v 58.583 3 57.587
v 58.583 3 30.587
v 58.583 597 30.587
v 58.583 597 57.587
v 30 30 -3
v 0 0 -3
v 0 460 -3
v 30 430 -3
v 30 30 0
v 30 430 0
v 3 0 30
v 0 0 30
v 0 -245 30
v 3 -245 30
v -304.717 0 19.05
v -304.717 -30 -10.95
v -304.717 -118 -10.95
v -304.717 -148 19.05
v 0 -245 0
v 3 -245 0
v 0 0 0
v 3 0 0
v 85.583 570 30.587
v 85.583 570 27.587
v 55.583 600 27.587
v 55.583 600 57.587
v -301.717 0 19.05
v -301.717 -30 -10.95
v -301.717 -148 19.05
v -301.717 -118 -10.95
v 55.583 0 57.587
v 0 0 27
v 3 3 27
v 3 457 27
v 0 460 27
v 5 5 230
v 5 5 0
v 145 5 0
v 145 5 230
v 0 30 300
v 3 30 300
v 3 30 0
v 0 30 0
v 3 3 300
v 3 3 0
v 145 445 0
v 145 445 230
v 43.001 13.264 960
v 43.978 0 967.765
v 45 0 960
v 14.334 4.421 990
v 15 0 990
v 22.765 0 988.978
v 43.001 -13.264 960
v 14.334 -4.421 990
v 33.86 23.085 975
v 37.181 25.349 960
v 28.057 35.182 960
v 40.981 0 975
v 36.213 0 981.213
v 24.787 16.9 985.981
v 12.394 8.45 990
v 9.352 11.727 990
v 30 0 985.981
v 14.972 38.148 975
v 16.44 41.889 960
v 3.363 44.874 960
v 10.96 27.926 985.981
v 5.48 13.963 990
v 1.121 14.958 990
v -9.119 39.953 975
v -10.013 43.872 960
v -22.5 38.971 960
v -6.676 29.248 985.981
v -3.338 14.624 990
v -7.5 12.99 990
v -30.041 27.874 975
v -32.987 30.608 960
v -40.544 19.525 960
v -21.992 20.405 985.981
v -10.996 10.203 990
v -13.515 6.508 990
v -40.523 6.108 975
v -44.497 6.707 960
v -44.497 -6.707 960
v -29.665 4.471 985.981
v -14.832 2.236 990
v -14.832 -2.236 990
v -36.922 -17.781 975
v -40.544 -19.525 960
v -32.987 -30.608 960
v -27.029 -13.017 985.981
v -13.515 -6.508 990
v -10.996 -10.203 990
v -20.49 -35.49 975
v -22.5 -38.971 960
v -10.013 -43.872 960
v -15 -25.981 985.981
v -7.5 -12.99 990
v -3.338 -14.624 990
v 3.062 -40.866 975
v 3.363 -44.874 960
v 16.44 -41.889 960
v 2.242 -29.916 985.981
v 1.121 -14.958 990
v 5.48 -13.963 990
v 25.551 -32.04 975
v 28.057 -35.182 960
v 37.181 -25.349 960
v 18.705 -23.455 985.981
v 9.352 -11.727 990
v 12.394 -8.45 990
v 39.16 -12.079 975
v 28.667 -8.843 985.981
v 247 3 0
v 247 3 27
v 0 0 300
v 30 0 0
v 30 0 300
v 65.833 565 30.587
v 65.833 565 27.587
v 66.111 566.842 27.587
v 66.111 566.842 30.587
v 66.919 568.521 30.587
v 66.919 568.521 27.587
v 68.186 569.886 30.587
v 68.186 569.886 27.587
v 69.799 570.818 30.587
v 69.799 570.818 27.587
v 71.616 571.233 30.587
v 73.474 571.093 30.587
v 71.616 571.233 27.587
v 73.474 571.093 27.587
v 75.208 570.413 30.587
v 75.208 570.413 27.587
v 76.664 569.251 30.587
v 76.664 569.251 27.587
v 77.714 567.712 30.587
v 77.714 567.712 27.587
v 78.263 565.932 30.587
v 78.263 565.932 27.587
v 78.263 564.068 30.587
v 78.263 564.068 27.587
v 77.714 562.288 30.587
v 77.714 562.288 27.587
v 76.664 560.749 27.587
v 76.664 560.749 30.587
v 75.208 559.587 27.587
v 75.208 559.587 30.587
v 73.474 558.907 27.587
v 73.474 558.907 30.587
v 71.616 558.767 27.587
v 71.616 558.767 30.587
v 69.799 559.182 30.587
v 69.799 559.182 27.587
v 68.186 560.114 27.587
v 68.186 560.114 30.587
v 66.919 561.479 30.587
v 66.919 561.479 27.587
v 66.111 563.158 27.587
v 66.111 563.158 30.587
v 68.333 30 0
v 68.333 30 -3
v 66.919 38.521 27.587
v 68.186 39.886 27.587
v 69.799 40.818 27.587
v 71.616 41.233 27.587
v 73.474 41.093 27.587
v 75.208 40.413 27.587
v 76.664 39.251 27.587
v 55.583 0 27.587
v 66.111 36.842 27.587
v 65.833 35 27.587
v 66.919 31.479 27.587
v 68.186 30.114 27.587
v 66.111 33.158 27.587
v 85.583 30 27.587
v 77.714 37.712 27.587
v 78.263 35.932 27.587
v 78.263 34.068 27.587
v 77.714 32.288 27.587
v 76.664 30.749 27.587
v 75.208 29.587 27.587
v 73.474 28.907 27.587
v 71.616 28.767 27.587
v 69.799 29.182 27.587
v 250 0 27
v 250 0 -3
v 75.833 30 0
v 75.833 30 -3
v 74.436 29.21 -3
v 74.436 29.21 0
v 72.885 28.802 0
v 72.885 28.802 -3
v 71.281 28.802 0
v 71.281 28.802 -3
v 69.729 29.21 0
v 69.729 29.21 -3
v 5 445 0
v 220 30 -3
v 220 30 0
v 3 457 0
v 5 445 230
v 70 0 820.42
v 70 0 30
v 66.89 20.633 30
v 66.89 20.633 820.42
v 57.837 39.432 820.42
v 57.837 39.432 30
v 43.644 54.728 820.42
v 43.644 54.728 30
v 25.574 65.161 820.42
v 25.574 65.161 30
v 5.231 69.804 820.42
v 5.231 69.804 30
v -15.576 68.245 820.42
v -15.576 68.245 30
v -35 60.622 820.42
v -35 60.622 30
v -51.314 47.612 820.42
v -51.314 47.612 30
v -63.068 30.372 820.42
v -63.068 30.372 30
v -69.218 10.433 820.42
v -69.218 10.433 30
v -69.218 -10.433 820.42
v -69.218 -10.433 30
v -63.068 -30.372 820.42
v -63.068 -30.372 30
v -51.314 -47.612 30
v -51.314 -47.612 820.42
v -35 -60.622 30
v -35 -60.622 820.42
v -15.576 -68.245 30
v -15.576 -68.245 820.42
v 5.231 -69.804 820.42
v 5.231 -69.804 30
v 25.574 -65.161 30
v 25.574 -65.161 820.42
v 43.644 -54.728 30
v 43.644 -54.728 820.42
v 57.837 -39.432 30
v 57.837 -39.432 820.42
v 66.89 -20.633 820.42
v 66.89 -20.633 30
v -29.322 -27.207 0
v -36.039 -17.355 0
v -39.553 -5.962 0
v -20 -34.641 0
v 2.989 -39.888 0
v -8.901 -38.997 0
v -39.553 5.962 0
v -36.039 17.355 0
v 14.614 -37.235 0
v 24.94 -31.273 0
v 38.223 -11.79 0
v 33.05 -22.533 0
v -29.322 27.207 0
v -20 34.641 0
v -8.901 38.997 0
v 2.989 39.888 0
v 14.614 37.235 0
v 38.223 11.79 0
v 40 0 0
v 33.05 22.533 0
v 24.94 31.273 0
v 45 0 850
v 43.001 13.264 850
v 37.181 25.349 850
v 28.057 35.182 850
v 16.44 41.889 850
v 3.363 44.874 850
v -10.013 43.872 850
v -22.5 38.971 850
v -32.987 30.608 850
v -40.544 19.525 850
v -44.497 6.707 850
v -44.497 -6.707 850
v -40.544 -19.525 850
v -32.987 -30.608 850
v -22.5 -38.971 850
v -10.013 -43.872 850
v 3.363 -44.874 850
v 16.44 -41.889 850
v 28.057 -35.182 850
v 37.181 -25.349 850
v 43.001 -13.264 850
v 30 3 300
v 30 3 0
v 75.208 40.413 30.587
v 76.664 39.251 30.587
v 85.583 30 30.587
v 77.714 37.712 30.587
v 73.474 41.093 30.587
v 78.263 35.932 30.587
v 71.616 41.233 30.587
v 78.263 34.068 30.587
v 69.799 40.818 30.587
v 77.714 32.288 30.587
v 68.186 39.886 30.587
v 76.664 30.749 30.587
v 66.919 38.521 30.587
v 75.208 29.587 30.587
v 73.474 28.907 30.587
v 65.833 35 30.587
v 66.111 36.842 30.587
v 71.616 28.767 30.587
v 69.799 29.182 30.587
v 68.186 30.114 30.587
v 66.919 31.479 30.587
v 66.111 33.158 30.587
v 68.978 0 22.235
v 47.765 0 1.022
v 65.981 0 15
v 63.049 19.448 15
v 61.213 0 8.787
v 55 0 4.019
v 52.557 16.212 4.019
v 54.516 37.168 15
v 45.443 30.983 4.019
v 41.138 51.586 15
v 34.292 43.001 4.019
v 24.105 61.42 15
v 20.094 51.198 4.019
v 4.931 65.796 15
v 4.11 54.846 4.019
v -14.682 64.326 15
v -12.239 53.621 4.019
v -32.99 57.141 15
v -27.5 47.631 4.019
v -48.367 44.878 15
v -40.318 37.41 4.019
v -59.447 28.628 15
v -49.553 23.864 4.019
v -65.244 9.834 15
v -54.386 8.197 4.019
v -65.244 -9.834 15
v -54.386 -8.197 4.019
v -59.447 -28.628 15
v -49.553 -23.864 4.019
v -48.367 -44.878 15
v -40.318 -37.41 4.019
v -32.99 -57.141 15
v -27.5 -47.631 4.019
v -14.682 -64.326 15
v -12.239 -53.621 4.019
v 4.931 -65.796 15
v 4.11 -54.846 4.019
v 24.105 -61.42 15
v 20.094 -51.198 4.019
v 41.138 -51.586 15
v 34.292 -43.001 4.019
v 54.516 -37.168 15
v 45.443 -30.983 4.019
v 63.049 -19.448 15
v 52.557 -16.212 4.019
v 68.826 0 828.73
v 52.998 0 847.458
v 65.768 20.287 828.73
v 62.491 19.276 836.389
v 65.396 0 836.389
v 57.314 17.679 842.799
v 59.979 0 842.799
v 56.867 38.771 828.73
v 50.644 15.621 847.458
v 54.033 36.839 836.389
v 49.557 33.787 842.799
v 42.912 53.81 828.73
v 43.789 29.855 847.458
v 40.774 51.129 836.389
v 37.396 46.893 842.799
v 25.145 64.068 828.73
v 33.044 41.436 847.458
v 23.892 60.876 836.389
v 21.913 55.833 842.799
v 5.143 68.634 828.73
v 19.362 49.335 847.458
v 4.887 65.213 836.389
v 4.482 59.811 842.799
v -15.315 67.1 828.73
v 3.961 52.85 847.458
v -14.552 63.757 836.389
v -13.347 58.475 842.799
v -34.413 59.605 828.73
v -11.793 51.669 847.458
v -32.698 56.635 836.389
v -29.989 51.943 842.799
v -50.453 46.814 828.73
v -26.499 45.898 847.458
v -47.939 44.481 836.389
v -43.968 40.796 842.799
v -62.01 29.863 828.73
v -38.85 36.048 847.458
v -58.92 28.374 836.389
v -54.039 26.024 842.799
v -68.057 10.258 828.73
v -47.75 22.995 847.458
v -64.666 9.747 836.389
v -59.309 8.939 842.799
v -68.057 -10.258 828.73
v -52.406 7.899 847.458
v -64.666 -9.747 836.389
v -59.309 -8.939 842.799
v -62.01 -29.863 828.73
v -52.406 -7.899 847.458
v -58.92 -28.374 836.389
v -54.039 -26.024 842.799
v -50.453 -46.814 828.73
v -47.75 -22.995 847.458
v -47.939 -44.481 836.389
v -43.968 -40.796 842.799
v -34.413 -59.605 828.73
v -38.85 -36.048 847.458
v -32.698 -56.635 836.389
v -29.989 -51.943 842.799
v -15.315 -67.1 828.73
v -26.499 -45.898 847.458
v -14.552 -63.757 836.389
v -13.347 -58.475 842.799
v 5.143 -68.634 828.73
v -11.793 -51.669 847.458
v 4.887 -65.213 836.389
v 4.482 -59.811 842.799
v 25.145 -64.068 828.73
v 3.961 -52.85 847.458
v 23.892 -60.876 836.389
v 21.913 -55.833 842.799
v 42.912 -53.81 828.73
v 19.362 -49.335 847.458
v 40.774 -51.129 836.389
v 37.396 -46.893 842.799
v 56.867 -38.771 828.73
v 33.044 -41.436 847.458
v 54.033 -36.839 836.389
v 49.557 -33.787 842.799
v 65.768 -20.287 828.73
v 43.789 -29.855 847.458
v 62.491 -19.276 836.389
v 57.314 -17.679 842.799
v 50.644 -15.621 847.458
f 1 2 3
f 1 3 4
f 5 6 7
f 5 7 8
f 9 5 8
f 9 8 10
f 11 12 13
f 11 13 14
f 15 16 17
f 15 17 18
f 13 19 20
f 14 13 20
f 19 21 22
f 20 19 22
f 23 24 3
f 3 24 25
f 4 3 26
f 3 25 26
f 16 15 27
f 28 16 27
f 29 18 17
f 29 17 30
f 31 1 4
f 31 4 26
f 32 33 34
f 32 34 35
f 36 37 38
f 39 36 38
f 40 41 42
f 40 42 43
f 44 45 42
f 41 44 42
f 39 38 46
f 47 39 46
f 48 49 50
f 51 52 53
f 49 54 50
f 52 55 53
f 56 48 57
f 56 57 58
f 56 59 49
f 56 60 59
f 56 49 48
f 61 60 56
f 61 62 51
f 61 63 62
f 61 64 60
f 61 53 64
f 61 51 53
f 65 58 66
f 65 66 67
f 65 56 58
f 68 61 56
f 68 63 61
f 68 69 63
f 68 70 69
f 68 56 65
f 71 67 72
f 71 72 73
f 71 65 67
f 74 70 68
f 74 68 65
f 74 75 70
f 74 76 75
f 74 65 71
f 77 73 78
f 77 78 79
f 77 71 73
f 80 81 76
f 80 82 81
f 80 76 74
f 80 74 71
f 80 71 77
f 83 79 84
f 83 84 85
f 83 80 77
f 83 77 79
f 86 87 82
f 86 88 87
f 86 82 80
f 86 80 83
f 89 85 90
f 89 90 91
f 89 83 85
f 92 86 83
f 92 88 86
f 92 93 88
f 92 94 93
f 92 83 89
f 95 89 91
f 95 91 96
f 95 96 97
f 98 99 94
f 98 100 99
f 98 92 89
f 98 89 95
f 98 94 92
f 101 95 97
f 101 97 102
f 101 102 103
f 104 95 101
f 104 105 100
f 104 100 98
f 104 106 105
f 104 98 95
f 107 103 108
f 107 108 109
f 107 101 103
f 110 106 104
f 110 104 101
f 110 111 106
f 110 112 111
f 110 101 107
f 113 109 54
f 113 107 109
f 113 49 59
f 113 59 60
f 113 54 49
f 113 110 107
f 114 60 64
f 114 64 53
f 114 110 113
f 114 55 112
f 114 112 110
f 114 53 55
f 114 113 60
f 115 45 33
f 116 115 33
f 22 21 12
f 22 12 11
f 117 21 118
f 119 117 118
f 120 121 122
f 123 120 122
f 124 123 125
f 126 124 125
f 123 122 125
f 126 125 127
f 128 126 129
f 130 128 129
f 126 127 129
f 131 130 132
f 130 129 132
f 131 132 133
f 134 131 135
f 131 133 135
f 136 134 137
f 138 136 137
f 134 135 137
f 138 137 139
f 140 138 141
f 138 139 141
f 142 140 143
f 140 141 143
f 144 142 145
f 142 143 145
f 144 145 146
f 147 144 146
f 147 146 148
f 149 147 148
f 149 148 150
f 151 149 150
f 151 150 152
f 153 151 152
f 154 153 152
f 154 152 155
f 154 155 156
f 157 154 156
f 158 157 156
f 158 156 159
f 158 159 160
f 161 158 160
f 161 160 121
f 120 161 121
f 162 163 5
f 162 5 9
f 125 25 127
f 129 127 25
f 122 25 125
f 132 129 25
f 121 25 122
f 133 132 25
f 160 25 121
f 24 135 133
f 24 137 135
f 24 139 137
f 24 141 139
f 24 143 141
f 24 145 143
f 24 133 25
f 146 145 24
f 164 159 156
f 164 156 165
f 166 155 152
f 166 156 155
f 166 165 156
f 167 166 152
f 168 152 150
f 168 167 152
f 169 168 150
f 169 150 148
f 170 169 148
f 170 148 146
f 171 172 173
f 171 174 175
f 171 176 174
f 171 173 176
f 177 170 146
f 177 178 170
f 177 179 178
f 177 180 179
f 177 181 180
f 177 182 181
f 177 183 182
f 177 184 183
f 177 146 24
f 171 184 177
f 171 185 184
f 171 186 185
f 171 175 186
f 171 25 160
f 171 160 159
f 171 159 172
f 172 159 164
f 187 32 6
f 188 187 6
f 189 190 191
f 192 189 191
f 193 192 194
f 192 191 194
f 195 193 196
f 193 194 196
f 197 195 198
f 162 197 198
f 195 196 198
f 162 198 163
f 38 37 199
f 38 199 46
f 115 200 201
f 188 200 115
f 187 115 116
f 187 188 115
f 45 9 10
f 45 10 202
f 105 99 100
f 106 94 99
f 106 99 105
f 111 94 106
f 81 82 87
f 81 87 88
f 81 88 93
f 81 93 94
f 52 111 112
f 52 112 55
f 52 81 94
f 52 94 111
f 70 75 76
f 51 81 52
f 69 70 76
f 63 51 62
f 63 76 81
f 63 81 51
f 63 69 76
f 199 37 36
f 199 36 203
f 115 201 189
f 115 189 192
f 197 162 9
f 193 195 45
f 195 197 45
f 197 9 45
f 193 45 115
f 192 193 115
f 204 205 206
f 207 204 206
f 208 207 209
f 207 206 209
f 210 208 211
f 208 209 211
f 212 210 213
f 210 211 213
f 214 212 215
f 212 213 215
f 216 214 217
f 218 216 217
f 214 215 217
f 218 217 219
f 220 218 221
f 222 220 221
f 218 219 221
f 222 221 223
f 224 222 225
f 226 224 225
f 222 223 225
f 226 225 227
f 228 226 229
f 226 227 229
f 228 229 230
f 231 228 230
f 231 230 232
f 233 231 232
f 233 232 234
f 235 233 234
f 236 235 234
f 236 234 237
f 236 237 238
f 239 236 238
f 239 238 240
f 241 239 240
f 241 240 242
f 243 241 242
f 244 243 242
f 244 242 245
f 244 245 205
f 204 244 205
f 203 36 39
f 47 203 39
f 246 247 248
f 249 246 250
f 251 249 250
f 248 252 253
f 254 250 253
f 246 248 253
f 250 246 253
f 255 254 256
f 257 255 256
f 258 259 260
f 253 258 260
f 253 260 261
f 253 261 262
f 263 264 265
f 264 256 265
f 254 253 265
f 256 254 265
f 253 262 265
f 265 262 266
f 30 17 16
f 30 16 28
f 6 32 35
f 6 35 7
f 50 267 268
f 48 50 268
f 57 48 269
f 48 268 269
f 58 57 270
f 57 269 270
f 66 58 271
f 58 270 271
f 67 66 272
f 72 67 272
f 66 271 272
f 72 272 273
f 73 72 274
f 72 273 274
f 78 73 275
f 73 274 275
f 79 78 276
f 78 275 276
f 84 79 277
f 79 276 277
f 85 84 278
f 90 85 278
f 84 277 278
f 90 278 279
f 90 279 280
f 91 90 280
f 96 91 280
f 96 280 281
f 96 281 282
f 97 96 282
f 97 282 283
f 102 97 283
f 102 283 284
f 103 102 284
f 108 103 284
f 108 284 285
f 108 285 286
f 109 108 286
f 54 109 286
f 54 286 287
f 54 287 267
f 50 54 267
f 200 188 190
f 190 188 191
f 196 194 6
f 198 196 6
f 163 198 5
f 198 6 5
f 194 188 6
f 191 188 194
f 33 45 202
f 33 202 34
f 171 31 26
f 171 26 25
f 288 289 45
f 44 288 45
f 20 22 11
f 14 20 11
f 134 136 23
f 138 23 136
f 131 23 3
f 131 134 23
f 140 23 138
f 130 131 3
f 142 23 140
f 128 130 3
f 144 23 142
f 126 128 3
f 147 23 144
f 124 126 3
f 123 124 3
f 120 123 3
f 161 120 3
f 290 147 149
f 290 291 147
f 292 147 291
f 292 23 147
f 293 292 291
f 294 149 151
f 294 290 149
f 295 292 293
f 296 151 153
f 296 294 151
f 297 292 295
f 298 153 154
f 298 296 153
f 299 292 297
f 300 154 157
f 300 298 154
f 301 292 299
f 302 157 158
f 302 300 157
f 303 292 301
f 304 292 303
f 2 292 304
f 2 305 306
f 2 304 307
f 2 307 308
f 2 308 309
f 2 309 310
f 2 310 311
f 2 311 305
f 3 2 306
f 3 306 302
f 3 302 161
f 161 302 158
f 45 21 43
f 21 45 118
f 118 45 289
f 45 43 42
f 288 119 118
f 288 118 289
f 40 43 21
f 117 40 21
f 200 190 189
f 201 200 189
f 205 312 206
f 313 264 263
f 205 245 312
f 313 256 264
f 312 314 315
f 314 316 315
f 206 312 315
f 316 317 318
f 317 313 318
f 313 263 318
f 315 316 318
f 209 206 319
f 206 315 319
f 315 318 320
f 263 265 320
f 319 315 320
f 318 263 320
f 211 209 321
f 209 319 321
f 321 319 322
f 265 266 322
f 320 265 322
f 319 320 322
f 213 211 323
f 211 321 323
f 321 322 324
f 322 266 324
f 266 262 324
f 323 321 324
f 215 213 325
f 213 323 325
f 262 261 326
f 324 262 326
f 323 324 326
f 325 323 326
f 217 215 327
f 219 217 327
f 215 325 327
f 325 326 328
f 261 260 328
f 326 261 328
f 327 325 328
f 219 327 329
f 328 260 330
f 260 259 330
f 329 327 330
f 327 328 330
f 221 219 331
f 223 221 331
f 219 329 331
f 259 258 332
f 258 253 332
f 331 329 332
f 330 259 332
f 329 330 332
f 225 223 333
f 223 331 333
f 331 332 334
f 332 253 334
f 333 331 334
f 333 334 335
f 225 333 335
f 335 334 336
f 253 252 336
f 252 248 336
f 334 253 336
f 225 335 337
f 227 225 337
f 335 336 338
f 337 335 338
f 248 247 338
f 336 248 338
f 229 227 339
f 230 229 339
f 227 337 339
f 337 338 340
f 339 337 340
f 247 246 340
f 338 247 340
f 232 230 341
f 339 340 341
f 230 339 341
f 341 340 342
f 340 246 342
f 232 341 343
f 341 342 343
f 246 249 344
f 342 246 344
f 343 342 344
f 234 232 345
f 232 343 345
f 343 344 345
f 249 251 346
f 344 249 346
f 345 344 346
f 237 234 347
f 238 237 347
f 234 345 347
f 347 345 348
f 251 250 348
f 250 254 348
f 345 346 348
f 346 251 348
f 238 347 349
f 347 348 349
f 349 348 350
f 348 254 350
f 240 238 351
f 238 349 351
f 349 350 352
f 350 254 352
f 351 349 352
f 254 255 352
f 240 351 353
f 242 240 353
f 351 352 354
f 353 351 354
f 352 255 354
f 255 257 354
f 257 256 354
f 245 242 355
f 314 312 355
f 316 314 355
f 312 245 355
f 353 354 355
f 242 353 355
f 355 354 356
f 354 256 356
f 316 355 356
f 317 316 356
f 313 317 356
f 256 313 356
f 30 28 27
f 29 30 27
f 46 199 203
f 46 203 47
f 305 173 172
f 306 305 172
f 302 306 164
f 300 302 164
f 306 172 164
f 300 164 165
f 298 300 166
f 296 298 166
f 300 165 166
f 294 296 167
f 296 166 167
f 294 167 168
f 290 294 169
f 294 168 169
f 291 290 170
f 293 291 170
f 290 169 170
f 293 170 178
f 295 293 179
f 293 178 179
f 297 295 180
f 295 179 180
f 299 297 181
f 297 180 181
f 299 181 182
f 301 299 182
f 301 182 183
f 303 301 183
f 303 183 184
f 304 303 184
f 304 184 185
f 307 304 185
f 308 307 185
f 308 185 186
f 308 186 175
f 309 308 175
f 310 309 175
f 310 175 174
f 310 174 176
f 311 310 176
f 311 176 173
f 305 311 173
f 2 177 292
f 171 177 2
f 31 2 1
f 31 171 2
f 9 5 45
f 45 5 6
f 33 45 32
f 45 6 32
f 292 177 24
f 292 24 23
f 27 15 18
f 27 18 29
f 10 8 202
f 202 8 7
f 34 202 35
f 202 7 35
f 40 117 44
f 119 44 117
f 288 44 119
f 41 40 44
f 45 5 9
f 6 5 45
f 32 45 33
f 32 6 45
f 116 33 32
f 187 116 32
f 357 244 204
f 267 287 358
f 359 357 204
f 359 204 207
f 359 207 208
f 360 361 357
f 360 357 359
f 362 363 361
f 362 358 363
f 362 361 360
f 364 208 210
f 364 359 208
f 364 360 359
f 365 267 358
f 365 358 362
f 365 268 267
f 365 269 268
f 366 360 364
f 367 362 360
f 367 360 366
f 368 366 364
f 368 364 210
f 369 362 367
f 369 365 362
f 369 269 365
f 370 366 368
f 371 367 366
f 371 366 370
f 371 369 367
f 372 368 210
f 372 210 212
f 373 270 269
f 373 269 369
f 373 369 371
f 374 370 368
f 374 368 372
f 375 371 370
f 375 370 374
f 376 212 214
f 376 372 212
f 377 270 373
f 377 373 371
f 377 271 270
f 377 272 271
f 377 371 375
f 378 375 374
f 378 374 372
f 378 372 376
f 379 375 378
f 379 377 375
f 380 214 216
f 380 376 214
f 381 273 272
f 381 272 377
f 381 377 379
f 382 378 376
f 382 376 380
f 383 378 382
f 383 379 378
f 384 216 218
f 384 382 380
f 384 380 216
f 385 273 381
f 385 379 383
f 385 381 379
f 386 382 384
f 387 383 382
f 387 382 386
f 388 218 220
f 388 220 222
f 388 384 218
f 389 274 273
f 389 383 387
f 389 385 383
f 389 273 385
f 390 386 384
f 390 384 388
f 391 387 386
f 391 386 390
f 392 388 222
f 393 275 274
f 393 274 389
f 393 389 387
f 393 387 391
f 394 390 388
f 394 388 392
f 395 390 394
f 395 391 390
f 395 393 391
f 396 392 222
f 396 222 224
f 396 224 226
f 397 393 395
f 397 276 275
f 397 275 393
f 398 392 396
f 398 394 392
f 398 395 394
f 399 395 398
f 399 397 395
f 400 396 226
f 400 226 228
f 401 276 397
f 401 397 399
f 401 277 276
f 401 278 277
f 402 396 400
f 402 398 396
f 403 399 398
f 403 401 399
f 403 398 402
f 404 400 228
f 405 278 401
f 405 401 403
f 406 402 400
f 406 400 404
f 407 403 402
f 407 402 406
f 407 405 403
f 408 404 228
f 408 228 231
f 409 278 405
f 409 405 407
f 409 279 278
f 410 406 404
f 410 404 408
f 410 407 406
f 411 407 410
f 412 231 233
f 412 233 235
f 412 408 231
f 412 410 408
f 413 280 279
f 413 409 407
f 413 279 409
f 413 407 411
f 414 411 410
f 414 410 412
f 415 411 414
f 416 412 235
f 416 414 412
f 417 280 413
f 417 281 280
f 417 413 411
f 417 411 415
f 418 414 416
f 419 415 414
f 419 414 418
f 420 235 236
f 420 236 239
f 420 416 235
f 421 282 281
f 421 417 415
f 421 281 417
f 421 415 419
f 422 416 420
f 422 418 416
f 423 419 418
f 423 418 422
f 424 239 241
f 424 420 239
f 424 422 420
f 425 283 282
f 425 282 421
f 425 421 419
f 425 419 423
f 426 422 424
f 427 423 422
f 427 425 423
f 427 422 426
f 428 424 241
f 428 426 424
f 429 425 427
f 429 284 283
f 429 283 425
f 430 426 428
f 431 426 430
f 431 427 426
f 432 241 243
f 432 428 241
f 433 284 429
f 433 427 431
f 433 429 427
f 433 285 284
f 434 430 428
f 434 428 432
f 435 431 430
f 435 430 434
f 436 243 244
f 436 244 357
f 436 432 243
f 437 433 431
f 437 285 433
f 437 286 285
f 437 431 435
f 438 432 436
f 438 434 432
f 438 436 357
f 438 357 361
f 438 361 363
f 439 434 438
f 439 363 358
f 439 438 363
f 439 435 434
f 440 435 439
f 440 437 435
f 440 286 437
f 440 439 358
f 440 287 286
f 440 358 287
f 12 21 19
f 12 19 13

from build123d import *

# Parameters (mm, degrees)
F0_W      = 140
F0_H      = 440
F1_DEPTH  = 230
F3_DEPTH  = 460
F4_SIZE   = 29.99999
F6_DEPTH  = 250
F7_SIZE   = 29.99999
F9_DEPTH  = 300
F11_DEPTH = 600
F12_SIZE  = 29.99999
F13_W     = 3
F13_H     = 30
F14_DEPTH = 245
F15_W     = 3
F15_H     = 30
F16_DEPTH = 148
F17_SIZE  = 29.99999
F19_D     = 12.5
F19_2_D   = 12.5
F20_R     = 70
F21_DEPTH = 850
F22_R     = 45
F23_DEPTH = 140


# Not quite as in the source:
# - a fillet or chamfer that OpenCascade refuses, or shapes differently, is made with other operations: its cross-section is extruded or revolved along the edge and cut away or added
# - a fillet or chamfer is up to 0.001 mm smaller than in the source, because OpenCascade refuses the exact size


with BuildPart() as f1:
    # F0 (on Top) → F1 (new body)
    with BuildSketch(Plane.XY):
        with Locations((75, 225)):
            Rectangle(F0_W, F0_H)
    extrude(amount=F1_DEPTH)


with BuildPart() as f3:
    # F2 (on Front) → F3 (new body)
    with BuildSketch(Plane.XZ):
        Polygon((3, 0), (3, 27), (0, 27), (0, -3), (30, -3), (30, 0), align=None)
    extrude(amount=-F3_DEPTH)

    # F4 (size 30 in the source; OpenCascade refuses exactly that, so slightly less here)
    f4_edges = [f3.edges().sort_by_distance(p)[0] for p in [
        (30, 460, -1.5),
        (30, 0, -1.5),
    ]]
    chamfer(f4_edges, length=F4_SIZE)


with BuildPart() as f6:
    # F5 (on Right) → F6 (new body)
    with BuildSketch(Plane.YZ):
        Polygon((3, 27), (0, 27), (0, -3), (30, -3), (30, 0), (3, 0), align=None)
    extrude(amount=F6_DEPTH)

    # F7 (size 30 in the source; OpenCascade refuses exactly that, so slightly less here)
    f7_edges = [f6.edges().sort_by_distance(p)[0] for p in [
        (0, 30, -1.5),
        (250, 30, -1.5),
    ]]
    chamfer(f7_edges, length=F7_SIZE)

    # F19 (through all)
    with Locations(Plane.XY.offset(30.5873168707)):
        with Locations((72.0828511119, 35), (72.0828511119, 565)):
            Hole(F19_D / 2)


with BuildPart() as f9:
    # F8 (on Top) → F9 (new body)
    with BuildSketch(Plane.XY):
        Polygon((0, 30), (0, 0), (30, 0), (30, 3), (3, 3), (3, 30), align=None)
    extrude(amount=F9_DEPTH)


with BuildPart() as f11:
    # F10 (on Front) → F11 (new body)
    with BuildSketch(Plane.XZ):
        Polygon((58.5828511119, 30.5873168707), (58.5828511119, 57.5873168707), (55.5828511119, 57.5873168707), (55.5828511119, 27.5873168707), (85.5828511119, 27.5873168707), (85.5828511119, 30.5873168707), align=None)
    extrude(amount=-F11_DEPTH)

    # F12 (size 30 in the source; OpenCascade refuses exactly that, so slightly less here)
    f12_edges = [f11.edges().sort_by_distance(p)[0] for p in [
        (85.582851, 0, 29.087317),
        (85.582851, 600, 29.087317),
    ]]
    chamfer(f12_edges, length=F12_SIZE)

    # F19#2 (through all)
    with Locations(Plane.XY.offset(30.5873168707)):
        with Locations((72.0828511119, 35), (72.0828511119, 565)):
            Hole(F19_2_D / 2)


with BuildPart() as f14:
    # F13 (on Front) → F14 (new body)
    with BuildSketch(Plane.XZ):
        with Locations((1.5, 15)):
            Rectangle(F13_W, F13_H)
    extrude(amount=F14_DEPTH)


with BuildPart() as f16:
    # F15 (on Front) → F16 (new body)
    with BuildSketch(Plane.XZ):
        with Locations((-303.2166957855, 4.0501020849)):
            Rectangle(F15_W, F15_H)
    extrude(amount=F16_DEPTH)

    # F17 (size 30 in the source; OpenCascade refuses exactly that, so slightly less here)
    f17_edges = [f16.edges().sort_by_distance(p)[0] for p in [
        (-303.216696, 0, -10.949898),
        (-303.216696, -148, -10.949898),
    ]]
    chamfer(f17_edges, length=F17_SIZE)


with BuildPart() as f21:
    # F20 (on Top) → F21 (new body)
    with BuildSketch(Plane.XY):
        Circle(F20_R)
    extrude(amount=F21_DEPTH)

    # F22 (on face) → F23 (join)
    with BuildSketch(Plane.XY.offset(850)):
        Circle(F22_R)
    extrude(amount=F23_DEPTH)

    # F24: fillet of radius 30 on 3 edges, made by hand

    # F24_s1 → F24_t2 (revolve, cut)
    with BuildSketch(Plane.XZ):
        with BuildLine():
            ThreePointArc((70, 30), (61.2132034356, 8.7867965644), (40, 0))
            Line((40, 0), (70, 0))
            Line((70, 0), (70, 30))
        make_face()
    revolve(axis=Axis((0, 0, 0), (0, 0, 1)), mode=Mode.SUBTRACT)

    # F24_s3 → F24_t4 (revolve, cut)
    with BuildSketch(Plane.XZ):
        with BuildLine():
            ThreePointArc((70, 820.4196010845), (62.9128784748, 839.7845178155), (45, 850))
            Line((45, 850), (70, 850))
            Line((70, 850), (70, 820.4196010845))
        make_face()
    revolve(axis=Axis((0, 0, 850), (0, 0, 1)), mode=Mode.SUBTRACT)

    # F24_s5 → F24_t6 (revolve, cut)
    with BuildSketch(Plane.XZ):
        with BuildLine():
            ThreePointArc((45, 960), (36.2132034356, 981.2132034356), (15, 990))
            Line((15, 990), (45, 990))
            Line((45, 990), (45, 960))
        make_face()
    revolve(axis=Axis((0, 0, 990), (0, 0, 1)), mode=Mode.SUBTRACT)


solid = Compound([f1.part, f3.part, f6.part, f9.part, f11.part, f14.part, f16.part, f21.part])
